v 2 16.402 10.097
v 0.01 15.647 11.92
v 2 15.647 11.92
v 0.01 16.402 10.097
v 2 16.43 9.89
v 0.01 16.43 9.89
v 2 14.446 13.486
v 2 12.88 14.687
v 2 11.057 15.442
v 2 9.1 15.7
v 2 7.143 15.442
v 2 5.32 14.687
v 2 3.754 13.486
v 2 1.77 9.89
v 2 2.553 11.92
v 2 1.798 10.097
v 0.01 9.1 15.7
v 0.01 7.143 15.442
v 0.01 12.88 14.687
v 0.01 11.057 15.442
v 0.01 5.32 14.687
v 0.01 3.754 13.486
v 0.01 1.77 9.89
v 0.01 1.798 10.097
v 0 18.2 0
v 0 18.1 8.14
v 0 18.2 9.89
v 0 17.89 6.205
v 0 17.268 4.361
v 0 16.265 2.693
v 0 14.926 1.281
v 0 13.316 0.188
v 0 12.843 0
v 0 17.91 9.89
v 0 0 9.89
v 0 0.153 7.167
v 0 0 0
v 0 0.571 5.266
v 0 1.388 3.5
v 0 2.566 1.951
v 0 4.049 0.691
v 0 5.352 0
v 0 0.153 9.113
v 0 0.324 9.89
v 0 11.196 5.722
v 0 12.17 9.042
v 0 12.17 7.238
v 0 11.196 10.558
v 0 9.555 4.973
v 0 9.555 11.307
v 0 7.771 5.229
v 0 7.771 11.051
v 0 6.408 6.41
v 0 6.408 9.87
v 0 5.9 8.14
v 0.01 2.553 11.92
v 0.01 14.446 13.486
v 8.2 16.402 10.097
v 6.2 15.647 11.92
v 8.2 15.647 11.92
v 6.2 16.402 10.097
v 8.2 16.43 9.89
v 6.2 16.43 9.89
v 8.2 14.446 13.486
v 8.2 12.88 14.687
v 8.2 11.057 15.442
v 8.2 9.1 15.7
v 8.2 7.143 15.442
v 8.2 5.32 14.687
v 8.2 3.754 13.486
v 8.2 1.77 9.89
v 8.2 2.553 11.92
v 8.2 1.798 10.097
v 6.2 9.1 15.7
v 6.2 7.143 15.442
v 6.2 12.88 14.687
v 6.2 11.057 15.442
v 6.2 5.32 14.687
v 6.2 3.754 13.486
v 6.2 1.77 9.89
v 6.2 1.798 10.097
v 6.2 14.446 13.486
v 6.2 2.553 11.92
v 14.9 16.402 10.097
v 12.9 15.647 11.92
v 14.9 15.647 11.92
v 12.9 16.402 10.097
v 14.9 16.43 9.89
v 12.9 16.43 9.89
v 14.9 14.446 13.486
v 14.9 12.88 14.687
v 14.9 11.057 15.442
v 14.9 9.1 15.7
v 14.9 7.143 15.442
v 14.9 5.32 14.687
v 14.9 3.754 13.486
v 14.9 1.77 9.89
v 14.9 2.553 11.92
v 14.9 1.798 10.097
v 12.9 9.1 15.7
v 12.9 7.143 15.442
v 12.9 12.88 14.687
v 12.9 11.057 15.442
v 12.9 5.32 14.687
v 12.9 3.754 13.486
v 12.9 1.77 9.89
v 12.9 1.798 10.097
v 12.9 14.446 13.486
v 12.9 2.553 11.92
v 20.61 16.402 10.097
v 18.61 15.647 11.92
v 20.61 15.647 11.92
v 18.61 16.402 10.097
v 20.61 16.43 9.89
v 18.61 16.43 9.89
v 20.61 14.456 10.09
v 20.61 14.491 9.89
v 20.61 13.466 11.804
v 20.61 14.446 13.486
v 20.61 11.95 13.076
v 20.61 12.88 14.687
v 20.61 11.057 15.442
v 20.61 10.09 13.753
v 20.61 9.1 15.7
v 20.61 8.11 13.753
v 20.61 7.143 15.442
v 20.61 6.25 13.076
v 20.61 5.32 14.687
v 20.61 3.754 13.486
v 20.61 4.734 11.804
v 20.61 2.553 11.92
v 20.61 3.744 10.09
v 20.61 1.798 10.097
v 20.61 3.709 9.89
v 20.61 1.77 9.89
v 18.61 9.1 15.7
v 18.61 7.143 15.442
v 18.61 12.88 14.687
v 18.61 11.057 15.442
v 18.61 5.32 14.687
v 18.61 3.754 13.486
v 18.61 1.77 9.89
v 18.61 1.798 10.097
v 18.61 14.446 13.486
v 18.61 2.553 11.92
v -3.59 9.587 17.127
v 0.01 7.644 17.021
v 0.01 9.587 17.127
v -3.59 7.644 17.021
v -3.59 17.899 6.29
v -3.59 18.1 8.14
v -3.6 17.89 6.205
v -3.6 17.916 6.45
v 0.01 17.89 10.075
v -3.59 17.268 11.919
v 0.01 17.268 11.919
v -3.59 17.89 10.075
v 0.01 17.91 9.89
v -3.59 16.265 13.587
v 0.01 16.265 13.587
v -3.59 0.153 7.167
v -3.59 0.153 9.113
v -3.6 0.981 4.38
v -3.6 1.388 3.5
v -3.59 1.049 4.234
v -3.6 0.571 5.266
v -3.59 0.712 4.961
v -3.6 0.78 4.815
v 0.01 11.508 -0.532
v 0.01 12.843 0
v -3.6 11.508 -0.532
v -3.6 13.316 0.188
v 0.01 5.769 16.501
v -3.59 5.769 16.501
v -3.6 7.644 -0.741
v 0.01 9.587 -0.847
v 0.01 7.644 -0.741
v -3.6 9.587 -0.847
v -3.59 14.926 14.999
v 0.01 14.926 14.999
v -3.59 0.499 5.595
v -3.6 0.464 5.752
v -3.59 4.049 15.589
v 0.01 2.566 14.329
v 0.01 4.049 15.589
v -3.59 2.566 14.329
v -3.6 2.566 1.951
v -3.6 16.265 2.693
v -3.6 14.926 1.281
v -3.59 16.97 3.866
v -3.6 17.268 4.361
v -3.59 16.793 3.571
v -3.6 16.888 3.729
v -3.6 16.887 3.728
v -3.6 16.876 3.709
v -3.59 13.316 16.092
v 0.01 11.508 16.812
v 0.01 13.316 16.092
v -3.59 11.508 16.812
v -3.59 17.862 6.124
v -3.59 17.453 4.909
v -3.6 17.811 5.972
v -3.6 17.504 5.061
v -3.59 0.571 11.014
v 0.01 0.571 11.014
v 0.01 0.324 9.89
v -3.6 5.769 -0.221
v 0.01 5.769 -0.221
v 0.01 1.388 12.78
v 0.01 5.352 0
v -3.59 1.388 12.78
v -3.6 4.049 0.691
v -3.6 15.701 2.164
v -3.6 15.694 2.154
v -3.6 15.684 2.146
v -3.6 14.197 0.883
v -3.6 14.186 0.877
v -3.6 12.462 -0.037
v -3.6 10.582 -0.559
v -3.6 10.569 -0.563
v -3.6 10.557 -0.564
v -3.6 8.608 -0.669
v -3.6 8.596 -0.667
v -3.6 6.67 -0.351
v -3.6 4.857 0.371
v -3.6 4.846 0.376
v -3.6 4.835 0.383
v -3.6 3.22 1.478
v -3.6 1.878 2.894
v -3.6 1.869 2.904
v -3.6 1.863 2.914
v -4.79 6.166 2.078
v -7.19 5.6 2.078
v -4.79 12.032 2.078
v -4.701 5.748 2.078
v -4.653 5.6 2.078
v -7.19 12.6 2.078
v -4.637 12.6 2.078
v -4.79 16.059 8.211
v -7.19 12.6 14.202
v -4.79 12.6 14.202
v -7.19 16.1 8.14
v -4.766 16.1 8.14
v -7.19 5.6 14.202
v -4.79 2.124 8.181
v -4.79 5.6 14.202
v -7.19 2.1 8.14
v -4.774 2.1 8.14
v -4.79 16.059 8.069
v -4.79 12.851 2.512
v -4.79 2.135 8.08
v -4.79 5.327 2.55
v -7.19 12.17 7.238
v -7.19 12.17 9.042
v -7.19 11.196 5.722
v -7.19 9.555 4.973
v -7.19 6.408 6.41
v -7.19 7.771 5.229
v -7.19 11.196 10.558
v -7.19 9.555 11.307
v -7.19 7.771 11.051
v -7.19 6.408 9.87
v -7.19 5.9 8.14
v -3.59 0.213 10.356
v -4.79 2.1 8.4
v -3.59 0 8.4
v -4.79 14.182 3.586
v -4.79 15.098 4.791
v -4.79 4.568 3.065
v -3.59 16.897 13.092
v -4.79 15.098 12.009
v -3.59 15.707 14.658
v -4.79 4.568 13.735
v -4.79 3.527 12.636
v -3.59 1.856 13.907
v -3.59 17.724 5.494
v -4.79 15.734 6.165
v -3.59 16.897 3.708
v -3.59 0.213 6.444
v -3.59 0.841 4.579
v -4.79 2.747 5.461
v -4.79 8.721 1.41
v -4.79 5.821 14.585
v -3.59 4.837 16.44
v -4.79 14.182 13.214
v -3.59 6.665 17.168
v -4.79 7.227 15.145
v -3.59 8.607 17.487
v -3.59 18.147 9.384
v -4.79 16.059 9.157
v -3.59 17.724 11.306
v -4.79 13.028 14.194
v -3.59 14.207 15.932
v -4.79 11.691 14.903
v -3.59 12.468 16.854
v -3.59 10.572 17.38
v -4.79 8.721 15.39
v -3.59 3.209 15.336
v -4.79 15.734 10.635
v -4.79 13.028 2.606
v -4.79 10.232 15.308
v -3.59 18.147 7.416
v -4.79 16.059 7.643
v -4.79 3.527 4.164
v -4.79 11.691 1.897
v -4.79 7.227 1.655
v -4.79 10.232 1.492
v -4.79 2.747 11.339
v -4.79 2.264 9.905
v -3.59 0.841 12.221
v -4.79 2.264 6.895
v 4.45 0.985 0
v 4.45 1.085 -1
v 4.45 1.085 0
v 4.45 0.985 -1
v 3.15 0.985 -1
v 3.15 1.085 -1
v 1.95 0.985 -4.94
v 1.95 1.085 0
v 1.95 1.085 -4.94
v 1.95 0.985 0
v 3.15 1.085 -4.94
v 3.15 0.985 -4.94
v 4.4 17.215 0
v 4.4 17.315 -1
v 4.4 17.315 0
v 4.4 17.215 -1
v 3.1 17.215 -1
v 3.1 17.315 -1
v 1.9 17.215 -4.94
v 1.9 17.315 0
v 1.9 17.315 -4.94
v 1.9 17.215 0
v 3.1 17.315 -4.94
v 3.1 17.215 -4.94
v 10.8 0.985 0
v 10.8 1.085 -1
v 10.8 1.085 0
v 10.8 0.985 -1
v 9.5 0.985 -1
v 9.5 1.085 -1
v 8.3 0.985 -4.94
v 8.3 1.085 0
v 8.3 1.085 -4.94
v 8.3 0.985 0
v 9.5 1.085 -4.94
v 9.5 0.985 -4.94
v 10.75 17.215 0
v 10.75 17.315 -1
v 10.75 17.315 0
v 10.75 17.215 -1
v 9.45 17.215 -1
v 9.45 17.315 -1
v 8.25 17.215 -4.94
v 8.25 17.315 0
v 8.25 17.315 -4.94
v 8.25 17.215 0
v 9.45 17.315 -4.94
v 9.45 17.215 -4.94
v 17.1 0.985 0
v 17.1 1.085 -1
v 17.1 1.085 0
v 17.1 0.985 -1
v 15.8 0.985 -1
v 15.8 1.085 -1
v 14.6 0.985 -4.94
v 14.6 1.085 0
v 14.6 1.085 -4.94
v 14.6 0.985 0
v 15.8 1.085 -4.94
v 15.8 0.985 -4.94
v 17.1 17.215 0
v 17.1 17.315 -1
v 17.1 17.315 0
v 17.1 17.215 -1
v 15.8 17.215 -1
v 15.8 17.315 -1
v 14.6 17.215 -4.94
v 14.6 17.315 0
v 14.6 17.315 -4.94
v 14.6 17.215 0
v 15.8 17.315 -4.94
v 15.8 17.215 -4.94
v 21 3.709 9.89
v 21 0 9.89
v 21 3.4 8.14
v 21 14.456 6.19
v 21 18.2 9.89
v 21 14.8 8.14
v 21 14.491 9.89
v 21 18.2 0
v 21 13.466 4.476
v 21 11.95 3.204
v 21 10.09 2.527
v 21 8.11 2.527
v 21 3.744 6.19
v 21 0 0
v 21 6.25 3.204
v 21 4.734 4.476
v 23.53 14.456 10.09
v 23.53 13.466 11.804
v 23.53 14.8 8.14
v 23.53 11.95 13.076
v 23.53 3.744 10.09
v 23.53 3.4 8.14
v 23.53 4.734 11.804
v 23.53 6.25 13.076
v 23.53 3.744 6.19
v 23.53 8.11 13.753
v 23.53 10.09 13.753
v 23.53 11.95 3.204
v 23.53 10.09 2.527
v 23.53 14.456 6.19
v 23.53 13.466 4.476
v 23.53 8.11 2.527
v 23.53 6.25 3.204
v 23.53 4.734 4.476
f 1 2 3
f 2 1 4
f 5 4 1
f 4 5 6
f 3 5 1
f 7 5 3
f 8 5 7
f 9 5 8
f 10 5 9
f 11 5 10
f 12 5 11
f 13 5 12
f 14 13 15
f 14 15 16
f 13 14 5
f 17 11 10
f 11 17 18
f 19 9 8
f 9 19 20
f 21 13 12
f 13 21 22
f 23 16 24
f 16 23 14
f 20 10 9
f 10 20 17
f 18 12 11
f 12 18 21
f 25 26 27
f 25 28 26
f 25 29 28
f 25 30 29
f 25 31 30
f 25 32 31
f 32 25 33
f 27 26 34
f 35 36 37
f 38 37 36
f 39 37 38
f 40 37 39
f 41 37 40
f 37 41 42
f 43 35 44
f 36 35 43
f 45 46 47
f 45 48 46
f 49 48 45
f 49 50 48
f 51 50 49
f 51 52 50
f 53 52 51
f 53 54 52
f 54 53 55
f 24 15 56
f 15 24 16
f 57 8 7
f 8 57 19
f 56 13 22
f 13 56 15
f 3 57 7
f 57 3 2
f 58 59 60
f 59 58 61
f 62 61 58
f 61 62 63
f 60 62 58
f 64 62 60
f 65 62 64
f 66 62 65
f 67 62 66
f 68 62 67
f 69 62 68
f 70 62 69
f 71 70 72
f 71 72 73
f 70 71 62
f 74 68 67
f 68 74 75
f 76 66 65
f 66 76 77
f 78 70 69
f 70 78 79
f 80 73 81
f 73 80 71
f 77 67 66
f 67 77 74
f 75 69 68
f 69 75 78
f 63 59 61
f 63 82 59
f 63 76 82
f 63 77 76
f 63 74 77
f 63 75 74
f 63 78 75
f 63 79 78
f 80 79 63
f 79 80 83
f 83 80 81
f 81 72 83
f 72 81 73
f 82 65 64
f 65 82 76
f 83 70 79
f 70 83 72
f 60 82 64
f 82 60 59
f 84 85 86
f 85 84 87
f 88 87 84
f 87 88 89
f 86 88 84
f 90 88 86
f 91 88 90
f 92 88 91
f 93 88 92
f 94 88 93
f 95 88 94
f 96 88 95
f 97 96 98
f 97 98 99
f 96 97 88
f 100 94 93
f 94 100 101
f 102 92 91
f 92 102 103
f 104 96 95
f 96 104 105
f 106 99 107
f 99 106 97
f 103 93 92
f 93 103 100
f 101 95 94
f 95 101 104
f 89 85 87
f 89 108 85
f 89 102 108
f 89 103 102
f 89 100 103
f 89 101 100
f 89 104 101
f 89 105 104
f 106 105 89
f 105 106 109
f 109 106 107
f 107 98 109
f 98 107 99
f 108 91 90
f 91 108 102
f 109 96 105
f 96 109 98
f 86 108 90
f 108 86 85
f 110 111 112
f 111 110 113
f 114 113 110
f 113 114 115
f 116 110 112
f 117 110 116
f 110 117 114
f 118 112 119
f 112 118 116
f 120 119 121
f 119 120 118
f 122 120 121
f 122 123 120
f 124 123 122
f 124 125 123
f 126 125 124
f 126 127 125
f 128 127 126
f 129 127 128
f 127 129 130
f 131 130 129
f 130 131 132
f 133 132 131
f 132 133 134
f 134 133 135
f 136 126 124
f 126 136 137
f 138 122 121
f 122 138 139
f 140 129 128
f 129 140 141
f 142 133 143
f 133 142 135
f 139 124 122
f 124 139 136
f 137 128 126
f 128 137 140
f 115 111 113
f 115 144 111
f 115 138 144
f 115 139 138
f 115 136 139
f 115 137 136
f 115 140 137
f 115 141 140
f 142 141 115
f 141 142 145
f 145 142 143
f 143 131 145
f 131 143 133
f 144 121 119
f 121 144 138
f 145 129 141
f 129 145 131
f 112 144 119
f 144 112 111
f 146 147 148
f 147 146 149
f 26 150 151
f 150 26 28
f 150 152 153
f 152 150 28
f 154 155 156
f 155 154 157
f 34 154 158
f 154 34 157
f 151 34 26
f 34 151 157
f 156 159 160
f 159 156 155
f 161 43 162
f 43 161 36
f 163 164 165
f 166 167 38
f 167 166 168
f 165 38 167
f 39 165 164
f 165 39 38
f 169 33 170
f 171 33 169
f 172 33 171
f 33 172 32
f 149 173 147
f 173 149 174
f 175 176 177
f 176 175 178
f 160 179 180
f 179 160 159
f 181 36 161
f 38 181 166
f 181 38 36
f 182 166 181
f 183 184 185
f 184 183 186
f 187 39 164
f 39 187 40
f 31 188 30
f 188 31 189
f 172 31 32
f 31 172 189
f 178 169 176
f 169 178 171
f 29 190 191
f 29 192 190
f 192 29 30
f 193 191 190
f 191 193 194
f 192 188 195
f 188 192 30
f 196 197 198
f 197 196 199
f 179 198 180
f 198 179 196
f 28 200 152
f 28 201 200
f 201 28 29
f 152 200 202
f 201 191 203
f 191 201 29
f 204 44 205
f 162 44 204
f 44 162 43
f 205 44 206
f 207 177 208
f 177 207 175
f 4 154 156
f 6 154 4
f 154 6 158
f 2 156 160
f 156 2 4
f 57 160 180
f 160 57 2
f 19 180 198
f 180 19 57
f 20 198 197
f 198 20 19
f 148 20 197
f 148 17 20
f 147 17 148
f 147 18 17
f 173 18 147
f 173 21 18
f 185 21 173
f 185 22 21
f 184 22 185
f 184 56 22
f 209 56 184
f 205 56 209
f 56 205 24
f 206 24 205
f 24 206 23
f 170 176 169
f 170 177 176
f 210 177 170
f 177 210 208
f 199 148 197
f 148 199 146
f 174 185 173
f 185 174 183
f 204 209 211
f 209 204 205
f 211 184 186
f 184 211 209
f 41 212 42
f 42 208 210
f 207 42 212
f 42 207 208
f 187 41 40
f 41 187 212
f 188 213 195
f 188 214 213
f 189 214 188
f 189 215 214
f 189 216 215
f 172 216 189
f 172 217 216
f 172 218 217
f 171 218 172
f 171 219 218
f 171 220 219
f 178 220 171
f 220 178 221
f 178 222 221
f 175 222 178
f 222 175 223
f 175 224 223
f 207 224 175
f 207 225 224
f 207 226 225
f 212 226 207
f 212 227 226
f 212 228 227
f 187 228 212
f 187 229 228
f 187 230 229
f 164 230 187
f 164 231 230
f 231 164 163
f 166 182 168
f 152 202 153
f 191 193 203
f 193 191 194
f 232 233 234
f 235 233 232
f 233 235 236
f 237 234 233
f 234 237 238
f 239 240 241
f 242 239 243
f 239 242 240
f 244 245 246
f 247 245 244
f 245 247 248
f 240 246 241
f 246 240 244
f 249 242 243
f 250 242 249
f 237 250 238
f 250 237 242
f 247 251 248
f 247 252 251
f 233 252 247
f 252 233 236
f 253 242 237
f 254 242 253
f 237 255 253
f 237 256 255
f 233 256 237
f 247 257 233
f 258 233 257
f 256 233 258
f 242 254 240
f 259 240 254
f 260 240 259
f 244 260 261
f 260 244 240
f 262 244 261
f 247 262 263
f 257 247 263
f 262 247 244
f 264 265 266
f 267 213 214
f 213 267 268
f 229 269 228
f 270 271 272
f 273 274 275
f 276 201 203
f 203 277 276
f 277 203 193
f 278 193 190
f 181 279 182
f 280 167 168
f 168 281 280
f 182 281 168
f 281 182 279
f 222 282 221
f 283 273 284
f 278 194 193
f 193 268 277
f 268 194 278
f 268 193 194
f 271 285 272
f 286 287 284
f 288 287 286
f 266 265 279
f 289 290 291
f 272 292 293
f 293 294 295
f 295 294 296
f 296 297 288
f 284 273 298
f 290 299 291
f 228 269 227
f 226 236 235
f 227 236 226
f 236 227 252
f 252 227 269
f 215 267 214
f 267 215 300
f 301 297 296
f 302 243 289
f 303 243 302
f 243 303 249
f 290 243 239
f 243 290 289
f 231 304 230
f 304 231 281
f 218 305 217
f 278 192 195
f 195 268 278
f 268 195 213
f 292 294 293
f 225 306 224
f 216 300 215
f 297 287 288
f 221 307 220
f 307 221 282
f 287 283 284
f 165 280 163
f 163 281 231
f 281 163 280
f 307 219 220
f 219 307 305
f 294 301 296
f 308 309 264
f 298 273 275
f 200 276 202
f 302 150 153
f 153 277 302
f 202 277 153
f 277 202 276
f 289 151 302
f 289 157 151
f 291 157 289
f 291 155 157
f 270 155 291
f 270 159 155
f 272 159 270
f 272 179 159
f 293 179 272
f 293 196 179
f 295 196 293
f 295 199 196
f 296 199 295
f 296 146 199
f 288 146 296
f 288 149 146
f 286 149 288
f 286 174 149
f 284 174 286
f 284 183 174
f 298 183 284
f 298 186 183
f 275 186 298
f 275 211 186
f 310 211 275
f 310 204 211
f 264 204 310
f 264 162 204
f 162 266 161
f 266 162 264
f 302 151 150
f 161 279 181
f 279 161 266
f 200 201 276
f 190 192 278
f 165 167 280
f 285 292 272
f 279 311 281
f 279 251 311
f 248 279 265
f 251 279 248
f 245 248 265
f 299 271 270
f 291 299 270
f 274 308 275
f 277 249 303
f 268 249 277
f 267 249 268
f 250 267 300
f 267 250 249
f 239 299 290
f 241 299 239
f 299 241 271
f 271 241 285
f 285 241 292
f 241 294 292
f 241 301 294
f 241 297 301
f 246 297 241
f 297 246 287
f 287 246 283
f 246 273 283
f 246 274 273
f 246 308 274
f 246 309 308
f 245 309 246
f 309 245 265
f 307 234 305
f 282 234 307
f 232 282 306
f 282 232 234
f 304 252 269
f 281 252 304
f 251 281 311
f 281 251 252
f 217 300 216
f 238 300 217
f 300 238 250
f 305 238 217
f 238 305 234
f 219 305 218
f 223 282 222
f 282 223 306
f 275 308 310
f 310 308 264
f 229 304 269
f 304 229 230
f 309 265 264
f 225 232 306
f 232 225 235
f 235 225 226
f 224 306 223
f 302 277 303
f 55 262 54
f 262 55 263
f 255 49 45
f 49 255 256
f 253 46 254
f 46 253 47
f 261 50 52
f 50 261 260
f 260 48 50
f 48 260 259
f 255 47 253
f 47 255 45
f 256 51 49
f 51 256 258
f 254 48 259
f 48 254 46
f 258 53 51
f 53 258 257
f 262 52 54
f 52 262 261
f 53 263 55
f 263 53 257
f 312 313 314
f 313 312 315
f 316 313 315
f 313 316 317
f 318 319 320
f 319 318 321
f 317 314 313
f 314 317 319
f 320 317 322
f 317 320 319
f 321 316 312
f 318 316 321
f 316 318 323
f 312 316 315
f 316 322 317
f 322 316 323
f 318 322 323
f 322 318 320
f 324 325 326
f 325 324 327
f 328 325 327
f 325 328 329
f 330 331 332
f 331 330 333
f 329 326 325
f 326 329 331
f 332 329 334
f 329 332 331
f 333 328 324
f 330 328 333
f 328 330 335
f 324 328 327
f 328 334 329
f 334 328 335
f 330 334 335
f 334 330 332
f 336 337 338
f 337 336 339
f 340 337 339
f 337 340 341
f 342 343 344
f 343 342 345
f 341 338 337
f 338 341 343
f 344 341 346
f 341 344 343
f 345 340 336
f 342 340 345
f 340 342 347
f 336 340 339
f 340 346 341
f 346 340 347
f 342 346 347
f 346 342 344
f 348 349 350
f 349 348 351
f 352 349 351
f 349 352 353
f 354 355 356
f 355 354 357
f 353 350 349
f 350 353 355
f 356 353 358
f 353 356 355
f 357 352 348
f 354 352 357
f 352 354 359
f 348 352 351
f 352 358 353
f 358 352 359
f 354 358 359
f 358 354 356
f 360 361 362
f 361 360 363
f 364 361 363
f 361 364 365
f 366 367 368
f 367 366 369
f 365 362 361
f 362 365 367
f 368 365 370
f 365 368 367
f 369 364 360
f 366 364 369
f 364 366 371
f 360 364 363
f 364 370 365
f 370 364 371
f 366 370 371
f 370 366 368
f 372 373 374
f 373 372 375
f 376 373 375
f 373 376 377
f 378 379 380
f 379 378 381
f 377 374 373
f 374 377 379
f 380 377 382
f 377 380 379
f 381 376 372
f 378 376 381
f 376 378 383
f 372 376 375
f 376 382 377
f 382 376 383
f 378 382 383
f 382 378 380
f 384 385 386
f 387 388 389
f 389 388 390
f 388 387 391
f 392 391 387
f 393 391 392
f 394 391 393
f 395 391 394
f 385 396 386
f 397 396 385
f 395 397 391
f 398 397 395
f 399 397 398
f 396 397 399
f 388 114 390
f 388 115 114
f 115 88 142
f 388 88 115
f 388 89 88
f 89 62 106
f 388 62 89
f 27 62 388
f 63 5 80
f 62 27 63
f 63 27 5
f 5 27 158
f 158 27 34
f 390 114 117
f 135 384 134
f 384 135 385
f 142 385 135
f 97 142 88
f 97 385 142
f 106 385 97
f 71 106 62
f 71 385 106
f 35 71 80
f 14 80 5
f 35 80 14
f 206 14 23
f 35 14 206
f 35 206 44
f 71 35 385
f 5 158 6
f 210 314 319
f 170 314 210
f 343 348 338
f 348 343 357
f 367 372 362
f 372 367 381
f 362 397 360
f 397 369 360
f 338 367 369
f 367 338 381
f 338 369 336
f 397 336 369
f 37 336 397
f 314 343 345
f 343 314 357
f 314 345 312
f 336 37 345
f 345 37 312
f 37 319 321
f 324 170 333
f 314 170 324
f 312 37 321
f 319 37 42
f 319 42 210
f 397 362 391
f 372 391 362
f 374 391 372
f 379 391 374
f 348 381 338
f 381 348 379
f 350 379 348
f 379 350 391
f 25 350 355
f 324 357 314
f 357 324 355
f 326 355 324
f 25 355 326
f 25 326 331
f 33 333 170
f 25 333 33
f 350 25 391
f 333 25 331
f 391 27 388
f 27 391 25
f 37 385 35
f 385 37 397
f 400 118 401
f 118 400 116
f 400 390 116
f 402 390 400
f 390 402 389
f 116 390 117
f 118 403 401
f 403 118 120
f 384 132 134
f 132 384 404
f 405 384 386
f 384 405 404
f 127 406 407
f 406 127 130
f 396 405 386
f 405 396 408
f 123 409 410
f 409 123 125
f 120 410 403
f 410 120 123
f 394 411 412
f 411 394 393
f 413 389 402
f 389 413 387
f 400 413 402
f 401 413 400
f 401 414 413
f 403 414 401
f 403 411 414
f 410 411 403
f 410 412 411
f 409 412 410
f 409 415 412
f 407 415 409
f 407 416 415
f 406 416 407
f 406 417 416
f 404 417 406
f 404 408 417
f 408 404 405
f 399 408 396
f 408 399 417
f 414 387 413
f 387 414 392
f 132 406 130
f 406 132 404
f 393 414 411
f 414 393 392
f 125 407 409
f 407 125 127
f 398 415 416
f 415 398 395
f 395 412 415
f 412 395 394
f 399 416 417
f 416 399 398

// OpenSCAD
/* 2014 Don Bosley : 
For updates/corrections email : don@bosleymusic.com
Neutrik Jack Set V 0.0
Mechanical Drawing
Compatible with Neutrik products : 
- mono jack, switched, full threaded nose, offset PCB pins

NMJ6HFD3

*/

//MAIN BODY
translate([0,0,0])
color("black") 
cube([21,18.2,9.89]); 

//FRONT 

//BODY SECTIONS
for (i = [ [0,9.1,8.14],
		   [6.2,9.1,8.14],
		   [12.9,9.1,8.14],
		   [18.61,9.1,8.14],
])
{
	color("black")
	translate(i)
	rotate([90,0,90])
	cylinder(r=15.7-8.14, h=2); 
}

//REAR CYLINDER
color("black")
translate([20.61,9.1,8.14])
rotate([90,0,90]) 
cylinder(r=5.7,h=23.53-20.61);


difference(){
	union(){
		//NUT
		color("lightgrey")
		translate([-3.59, 9.1,8.14])
		rotate([90,0,-90])
		cylinder(r=7,h=3.6, $fn=6); 
		
//FRONT WASHERS
		for ( i = [ [-1.2,9.1,8.14], 
					[-2.4,9.1,8.14], 
					[-3.6,9.1,8.14], 
		])
		{	
			color("black")
			translate(i)
			rotate([90,0,90])
			cylinder(r=9, h=1.21); 
		}
//FRONT BEVEL 
		color("black")
		translate([-3.59, 9.1,8.4])
		rotate([90,0,-90])
		cylinder(r2=7, r1=9.1,h=1.2);
//MAIN SHAFT 
		color("black")
		translate([-.15, 9.1,8.14])
		rotate([90,0,-90])
		cylinder(r=3.3,h=7); 

	}
//NUTHOLE
color("black")
translate([8, 9.1,8.14])
rotate([90,0,-90])
cylinder(r=3.2,h=24); 
}


/*ENSURE PIN CENTERS ARE ALIGNED (COMMENT OUT)
for (i = [  [2.9,2.23/2,-4],//S
		   [2.9,18.2-2.23/2,-4],//SN
		   [15.6,2.23/2,-4],//T
		   [15.6,18.2-2.23/2,-4],//TN

 ])
{
	translate(i)
	color("blue")
	cylinder(r=.65, h=9);
}
*/

//PINS 
for(i = [
	     [2.55-.6,.985,-1],//S
		 [2.55-.65,18.2-.985,-1],//SN
		 [8.9-.6,.985,-1],//R
		 [8.9-.65,18.2-.985,-1],//RN
	     [15.25-.65,.985,-1],//T
		 [15.25-.65,18.2-.985,-1],//TN

])
{
	translate(i)
	color("lightgrey") 
	union(){
			cube([2.5,.1,9.1]);  
			translate([0,0,-3.94])
			cube([1.2,.1,3.96]);
	}
}
